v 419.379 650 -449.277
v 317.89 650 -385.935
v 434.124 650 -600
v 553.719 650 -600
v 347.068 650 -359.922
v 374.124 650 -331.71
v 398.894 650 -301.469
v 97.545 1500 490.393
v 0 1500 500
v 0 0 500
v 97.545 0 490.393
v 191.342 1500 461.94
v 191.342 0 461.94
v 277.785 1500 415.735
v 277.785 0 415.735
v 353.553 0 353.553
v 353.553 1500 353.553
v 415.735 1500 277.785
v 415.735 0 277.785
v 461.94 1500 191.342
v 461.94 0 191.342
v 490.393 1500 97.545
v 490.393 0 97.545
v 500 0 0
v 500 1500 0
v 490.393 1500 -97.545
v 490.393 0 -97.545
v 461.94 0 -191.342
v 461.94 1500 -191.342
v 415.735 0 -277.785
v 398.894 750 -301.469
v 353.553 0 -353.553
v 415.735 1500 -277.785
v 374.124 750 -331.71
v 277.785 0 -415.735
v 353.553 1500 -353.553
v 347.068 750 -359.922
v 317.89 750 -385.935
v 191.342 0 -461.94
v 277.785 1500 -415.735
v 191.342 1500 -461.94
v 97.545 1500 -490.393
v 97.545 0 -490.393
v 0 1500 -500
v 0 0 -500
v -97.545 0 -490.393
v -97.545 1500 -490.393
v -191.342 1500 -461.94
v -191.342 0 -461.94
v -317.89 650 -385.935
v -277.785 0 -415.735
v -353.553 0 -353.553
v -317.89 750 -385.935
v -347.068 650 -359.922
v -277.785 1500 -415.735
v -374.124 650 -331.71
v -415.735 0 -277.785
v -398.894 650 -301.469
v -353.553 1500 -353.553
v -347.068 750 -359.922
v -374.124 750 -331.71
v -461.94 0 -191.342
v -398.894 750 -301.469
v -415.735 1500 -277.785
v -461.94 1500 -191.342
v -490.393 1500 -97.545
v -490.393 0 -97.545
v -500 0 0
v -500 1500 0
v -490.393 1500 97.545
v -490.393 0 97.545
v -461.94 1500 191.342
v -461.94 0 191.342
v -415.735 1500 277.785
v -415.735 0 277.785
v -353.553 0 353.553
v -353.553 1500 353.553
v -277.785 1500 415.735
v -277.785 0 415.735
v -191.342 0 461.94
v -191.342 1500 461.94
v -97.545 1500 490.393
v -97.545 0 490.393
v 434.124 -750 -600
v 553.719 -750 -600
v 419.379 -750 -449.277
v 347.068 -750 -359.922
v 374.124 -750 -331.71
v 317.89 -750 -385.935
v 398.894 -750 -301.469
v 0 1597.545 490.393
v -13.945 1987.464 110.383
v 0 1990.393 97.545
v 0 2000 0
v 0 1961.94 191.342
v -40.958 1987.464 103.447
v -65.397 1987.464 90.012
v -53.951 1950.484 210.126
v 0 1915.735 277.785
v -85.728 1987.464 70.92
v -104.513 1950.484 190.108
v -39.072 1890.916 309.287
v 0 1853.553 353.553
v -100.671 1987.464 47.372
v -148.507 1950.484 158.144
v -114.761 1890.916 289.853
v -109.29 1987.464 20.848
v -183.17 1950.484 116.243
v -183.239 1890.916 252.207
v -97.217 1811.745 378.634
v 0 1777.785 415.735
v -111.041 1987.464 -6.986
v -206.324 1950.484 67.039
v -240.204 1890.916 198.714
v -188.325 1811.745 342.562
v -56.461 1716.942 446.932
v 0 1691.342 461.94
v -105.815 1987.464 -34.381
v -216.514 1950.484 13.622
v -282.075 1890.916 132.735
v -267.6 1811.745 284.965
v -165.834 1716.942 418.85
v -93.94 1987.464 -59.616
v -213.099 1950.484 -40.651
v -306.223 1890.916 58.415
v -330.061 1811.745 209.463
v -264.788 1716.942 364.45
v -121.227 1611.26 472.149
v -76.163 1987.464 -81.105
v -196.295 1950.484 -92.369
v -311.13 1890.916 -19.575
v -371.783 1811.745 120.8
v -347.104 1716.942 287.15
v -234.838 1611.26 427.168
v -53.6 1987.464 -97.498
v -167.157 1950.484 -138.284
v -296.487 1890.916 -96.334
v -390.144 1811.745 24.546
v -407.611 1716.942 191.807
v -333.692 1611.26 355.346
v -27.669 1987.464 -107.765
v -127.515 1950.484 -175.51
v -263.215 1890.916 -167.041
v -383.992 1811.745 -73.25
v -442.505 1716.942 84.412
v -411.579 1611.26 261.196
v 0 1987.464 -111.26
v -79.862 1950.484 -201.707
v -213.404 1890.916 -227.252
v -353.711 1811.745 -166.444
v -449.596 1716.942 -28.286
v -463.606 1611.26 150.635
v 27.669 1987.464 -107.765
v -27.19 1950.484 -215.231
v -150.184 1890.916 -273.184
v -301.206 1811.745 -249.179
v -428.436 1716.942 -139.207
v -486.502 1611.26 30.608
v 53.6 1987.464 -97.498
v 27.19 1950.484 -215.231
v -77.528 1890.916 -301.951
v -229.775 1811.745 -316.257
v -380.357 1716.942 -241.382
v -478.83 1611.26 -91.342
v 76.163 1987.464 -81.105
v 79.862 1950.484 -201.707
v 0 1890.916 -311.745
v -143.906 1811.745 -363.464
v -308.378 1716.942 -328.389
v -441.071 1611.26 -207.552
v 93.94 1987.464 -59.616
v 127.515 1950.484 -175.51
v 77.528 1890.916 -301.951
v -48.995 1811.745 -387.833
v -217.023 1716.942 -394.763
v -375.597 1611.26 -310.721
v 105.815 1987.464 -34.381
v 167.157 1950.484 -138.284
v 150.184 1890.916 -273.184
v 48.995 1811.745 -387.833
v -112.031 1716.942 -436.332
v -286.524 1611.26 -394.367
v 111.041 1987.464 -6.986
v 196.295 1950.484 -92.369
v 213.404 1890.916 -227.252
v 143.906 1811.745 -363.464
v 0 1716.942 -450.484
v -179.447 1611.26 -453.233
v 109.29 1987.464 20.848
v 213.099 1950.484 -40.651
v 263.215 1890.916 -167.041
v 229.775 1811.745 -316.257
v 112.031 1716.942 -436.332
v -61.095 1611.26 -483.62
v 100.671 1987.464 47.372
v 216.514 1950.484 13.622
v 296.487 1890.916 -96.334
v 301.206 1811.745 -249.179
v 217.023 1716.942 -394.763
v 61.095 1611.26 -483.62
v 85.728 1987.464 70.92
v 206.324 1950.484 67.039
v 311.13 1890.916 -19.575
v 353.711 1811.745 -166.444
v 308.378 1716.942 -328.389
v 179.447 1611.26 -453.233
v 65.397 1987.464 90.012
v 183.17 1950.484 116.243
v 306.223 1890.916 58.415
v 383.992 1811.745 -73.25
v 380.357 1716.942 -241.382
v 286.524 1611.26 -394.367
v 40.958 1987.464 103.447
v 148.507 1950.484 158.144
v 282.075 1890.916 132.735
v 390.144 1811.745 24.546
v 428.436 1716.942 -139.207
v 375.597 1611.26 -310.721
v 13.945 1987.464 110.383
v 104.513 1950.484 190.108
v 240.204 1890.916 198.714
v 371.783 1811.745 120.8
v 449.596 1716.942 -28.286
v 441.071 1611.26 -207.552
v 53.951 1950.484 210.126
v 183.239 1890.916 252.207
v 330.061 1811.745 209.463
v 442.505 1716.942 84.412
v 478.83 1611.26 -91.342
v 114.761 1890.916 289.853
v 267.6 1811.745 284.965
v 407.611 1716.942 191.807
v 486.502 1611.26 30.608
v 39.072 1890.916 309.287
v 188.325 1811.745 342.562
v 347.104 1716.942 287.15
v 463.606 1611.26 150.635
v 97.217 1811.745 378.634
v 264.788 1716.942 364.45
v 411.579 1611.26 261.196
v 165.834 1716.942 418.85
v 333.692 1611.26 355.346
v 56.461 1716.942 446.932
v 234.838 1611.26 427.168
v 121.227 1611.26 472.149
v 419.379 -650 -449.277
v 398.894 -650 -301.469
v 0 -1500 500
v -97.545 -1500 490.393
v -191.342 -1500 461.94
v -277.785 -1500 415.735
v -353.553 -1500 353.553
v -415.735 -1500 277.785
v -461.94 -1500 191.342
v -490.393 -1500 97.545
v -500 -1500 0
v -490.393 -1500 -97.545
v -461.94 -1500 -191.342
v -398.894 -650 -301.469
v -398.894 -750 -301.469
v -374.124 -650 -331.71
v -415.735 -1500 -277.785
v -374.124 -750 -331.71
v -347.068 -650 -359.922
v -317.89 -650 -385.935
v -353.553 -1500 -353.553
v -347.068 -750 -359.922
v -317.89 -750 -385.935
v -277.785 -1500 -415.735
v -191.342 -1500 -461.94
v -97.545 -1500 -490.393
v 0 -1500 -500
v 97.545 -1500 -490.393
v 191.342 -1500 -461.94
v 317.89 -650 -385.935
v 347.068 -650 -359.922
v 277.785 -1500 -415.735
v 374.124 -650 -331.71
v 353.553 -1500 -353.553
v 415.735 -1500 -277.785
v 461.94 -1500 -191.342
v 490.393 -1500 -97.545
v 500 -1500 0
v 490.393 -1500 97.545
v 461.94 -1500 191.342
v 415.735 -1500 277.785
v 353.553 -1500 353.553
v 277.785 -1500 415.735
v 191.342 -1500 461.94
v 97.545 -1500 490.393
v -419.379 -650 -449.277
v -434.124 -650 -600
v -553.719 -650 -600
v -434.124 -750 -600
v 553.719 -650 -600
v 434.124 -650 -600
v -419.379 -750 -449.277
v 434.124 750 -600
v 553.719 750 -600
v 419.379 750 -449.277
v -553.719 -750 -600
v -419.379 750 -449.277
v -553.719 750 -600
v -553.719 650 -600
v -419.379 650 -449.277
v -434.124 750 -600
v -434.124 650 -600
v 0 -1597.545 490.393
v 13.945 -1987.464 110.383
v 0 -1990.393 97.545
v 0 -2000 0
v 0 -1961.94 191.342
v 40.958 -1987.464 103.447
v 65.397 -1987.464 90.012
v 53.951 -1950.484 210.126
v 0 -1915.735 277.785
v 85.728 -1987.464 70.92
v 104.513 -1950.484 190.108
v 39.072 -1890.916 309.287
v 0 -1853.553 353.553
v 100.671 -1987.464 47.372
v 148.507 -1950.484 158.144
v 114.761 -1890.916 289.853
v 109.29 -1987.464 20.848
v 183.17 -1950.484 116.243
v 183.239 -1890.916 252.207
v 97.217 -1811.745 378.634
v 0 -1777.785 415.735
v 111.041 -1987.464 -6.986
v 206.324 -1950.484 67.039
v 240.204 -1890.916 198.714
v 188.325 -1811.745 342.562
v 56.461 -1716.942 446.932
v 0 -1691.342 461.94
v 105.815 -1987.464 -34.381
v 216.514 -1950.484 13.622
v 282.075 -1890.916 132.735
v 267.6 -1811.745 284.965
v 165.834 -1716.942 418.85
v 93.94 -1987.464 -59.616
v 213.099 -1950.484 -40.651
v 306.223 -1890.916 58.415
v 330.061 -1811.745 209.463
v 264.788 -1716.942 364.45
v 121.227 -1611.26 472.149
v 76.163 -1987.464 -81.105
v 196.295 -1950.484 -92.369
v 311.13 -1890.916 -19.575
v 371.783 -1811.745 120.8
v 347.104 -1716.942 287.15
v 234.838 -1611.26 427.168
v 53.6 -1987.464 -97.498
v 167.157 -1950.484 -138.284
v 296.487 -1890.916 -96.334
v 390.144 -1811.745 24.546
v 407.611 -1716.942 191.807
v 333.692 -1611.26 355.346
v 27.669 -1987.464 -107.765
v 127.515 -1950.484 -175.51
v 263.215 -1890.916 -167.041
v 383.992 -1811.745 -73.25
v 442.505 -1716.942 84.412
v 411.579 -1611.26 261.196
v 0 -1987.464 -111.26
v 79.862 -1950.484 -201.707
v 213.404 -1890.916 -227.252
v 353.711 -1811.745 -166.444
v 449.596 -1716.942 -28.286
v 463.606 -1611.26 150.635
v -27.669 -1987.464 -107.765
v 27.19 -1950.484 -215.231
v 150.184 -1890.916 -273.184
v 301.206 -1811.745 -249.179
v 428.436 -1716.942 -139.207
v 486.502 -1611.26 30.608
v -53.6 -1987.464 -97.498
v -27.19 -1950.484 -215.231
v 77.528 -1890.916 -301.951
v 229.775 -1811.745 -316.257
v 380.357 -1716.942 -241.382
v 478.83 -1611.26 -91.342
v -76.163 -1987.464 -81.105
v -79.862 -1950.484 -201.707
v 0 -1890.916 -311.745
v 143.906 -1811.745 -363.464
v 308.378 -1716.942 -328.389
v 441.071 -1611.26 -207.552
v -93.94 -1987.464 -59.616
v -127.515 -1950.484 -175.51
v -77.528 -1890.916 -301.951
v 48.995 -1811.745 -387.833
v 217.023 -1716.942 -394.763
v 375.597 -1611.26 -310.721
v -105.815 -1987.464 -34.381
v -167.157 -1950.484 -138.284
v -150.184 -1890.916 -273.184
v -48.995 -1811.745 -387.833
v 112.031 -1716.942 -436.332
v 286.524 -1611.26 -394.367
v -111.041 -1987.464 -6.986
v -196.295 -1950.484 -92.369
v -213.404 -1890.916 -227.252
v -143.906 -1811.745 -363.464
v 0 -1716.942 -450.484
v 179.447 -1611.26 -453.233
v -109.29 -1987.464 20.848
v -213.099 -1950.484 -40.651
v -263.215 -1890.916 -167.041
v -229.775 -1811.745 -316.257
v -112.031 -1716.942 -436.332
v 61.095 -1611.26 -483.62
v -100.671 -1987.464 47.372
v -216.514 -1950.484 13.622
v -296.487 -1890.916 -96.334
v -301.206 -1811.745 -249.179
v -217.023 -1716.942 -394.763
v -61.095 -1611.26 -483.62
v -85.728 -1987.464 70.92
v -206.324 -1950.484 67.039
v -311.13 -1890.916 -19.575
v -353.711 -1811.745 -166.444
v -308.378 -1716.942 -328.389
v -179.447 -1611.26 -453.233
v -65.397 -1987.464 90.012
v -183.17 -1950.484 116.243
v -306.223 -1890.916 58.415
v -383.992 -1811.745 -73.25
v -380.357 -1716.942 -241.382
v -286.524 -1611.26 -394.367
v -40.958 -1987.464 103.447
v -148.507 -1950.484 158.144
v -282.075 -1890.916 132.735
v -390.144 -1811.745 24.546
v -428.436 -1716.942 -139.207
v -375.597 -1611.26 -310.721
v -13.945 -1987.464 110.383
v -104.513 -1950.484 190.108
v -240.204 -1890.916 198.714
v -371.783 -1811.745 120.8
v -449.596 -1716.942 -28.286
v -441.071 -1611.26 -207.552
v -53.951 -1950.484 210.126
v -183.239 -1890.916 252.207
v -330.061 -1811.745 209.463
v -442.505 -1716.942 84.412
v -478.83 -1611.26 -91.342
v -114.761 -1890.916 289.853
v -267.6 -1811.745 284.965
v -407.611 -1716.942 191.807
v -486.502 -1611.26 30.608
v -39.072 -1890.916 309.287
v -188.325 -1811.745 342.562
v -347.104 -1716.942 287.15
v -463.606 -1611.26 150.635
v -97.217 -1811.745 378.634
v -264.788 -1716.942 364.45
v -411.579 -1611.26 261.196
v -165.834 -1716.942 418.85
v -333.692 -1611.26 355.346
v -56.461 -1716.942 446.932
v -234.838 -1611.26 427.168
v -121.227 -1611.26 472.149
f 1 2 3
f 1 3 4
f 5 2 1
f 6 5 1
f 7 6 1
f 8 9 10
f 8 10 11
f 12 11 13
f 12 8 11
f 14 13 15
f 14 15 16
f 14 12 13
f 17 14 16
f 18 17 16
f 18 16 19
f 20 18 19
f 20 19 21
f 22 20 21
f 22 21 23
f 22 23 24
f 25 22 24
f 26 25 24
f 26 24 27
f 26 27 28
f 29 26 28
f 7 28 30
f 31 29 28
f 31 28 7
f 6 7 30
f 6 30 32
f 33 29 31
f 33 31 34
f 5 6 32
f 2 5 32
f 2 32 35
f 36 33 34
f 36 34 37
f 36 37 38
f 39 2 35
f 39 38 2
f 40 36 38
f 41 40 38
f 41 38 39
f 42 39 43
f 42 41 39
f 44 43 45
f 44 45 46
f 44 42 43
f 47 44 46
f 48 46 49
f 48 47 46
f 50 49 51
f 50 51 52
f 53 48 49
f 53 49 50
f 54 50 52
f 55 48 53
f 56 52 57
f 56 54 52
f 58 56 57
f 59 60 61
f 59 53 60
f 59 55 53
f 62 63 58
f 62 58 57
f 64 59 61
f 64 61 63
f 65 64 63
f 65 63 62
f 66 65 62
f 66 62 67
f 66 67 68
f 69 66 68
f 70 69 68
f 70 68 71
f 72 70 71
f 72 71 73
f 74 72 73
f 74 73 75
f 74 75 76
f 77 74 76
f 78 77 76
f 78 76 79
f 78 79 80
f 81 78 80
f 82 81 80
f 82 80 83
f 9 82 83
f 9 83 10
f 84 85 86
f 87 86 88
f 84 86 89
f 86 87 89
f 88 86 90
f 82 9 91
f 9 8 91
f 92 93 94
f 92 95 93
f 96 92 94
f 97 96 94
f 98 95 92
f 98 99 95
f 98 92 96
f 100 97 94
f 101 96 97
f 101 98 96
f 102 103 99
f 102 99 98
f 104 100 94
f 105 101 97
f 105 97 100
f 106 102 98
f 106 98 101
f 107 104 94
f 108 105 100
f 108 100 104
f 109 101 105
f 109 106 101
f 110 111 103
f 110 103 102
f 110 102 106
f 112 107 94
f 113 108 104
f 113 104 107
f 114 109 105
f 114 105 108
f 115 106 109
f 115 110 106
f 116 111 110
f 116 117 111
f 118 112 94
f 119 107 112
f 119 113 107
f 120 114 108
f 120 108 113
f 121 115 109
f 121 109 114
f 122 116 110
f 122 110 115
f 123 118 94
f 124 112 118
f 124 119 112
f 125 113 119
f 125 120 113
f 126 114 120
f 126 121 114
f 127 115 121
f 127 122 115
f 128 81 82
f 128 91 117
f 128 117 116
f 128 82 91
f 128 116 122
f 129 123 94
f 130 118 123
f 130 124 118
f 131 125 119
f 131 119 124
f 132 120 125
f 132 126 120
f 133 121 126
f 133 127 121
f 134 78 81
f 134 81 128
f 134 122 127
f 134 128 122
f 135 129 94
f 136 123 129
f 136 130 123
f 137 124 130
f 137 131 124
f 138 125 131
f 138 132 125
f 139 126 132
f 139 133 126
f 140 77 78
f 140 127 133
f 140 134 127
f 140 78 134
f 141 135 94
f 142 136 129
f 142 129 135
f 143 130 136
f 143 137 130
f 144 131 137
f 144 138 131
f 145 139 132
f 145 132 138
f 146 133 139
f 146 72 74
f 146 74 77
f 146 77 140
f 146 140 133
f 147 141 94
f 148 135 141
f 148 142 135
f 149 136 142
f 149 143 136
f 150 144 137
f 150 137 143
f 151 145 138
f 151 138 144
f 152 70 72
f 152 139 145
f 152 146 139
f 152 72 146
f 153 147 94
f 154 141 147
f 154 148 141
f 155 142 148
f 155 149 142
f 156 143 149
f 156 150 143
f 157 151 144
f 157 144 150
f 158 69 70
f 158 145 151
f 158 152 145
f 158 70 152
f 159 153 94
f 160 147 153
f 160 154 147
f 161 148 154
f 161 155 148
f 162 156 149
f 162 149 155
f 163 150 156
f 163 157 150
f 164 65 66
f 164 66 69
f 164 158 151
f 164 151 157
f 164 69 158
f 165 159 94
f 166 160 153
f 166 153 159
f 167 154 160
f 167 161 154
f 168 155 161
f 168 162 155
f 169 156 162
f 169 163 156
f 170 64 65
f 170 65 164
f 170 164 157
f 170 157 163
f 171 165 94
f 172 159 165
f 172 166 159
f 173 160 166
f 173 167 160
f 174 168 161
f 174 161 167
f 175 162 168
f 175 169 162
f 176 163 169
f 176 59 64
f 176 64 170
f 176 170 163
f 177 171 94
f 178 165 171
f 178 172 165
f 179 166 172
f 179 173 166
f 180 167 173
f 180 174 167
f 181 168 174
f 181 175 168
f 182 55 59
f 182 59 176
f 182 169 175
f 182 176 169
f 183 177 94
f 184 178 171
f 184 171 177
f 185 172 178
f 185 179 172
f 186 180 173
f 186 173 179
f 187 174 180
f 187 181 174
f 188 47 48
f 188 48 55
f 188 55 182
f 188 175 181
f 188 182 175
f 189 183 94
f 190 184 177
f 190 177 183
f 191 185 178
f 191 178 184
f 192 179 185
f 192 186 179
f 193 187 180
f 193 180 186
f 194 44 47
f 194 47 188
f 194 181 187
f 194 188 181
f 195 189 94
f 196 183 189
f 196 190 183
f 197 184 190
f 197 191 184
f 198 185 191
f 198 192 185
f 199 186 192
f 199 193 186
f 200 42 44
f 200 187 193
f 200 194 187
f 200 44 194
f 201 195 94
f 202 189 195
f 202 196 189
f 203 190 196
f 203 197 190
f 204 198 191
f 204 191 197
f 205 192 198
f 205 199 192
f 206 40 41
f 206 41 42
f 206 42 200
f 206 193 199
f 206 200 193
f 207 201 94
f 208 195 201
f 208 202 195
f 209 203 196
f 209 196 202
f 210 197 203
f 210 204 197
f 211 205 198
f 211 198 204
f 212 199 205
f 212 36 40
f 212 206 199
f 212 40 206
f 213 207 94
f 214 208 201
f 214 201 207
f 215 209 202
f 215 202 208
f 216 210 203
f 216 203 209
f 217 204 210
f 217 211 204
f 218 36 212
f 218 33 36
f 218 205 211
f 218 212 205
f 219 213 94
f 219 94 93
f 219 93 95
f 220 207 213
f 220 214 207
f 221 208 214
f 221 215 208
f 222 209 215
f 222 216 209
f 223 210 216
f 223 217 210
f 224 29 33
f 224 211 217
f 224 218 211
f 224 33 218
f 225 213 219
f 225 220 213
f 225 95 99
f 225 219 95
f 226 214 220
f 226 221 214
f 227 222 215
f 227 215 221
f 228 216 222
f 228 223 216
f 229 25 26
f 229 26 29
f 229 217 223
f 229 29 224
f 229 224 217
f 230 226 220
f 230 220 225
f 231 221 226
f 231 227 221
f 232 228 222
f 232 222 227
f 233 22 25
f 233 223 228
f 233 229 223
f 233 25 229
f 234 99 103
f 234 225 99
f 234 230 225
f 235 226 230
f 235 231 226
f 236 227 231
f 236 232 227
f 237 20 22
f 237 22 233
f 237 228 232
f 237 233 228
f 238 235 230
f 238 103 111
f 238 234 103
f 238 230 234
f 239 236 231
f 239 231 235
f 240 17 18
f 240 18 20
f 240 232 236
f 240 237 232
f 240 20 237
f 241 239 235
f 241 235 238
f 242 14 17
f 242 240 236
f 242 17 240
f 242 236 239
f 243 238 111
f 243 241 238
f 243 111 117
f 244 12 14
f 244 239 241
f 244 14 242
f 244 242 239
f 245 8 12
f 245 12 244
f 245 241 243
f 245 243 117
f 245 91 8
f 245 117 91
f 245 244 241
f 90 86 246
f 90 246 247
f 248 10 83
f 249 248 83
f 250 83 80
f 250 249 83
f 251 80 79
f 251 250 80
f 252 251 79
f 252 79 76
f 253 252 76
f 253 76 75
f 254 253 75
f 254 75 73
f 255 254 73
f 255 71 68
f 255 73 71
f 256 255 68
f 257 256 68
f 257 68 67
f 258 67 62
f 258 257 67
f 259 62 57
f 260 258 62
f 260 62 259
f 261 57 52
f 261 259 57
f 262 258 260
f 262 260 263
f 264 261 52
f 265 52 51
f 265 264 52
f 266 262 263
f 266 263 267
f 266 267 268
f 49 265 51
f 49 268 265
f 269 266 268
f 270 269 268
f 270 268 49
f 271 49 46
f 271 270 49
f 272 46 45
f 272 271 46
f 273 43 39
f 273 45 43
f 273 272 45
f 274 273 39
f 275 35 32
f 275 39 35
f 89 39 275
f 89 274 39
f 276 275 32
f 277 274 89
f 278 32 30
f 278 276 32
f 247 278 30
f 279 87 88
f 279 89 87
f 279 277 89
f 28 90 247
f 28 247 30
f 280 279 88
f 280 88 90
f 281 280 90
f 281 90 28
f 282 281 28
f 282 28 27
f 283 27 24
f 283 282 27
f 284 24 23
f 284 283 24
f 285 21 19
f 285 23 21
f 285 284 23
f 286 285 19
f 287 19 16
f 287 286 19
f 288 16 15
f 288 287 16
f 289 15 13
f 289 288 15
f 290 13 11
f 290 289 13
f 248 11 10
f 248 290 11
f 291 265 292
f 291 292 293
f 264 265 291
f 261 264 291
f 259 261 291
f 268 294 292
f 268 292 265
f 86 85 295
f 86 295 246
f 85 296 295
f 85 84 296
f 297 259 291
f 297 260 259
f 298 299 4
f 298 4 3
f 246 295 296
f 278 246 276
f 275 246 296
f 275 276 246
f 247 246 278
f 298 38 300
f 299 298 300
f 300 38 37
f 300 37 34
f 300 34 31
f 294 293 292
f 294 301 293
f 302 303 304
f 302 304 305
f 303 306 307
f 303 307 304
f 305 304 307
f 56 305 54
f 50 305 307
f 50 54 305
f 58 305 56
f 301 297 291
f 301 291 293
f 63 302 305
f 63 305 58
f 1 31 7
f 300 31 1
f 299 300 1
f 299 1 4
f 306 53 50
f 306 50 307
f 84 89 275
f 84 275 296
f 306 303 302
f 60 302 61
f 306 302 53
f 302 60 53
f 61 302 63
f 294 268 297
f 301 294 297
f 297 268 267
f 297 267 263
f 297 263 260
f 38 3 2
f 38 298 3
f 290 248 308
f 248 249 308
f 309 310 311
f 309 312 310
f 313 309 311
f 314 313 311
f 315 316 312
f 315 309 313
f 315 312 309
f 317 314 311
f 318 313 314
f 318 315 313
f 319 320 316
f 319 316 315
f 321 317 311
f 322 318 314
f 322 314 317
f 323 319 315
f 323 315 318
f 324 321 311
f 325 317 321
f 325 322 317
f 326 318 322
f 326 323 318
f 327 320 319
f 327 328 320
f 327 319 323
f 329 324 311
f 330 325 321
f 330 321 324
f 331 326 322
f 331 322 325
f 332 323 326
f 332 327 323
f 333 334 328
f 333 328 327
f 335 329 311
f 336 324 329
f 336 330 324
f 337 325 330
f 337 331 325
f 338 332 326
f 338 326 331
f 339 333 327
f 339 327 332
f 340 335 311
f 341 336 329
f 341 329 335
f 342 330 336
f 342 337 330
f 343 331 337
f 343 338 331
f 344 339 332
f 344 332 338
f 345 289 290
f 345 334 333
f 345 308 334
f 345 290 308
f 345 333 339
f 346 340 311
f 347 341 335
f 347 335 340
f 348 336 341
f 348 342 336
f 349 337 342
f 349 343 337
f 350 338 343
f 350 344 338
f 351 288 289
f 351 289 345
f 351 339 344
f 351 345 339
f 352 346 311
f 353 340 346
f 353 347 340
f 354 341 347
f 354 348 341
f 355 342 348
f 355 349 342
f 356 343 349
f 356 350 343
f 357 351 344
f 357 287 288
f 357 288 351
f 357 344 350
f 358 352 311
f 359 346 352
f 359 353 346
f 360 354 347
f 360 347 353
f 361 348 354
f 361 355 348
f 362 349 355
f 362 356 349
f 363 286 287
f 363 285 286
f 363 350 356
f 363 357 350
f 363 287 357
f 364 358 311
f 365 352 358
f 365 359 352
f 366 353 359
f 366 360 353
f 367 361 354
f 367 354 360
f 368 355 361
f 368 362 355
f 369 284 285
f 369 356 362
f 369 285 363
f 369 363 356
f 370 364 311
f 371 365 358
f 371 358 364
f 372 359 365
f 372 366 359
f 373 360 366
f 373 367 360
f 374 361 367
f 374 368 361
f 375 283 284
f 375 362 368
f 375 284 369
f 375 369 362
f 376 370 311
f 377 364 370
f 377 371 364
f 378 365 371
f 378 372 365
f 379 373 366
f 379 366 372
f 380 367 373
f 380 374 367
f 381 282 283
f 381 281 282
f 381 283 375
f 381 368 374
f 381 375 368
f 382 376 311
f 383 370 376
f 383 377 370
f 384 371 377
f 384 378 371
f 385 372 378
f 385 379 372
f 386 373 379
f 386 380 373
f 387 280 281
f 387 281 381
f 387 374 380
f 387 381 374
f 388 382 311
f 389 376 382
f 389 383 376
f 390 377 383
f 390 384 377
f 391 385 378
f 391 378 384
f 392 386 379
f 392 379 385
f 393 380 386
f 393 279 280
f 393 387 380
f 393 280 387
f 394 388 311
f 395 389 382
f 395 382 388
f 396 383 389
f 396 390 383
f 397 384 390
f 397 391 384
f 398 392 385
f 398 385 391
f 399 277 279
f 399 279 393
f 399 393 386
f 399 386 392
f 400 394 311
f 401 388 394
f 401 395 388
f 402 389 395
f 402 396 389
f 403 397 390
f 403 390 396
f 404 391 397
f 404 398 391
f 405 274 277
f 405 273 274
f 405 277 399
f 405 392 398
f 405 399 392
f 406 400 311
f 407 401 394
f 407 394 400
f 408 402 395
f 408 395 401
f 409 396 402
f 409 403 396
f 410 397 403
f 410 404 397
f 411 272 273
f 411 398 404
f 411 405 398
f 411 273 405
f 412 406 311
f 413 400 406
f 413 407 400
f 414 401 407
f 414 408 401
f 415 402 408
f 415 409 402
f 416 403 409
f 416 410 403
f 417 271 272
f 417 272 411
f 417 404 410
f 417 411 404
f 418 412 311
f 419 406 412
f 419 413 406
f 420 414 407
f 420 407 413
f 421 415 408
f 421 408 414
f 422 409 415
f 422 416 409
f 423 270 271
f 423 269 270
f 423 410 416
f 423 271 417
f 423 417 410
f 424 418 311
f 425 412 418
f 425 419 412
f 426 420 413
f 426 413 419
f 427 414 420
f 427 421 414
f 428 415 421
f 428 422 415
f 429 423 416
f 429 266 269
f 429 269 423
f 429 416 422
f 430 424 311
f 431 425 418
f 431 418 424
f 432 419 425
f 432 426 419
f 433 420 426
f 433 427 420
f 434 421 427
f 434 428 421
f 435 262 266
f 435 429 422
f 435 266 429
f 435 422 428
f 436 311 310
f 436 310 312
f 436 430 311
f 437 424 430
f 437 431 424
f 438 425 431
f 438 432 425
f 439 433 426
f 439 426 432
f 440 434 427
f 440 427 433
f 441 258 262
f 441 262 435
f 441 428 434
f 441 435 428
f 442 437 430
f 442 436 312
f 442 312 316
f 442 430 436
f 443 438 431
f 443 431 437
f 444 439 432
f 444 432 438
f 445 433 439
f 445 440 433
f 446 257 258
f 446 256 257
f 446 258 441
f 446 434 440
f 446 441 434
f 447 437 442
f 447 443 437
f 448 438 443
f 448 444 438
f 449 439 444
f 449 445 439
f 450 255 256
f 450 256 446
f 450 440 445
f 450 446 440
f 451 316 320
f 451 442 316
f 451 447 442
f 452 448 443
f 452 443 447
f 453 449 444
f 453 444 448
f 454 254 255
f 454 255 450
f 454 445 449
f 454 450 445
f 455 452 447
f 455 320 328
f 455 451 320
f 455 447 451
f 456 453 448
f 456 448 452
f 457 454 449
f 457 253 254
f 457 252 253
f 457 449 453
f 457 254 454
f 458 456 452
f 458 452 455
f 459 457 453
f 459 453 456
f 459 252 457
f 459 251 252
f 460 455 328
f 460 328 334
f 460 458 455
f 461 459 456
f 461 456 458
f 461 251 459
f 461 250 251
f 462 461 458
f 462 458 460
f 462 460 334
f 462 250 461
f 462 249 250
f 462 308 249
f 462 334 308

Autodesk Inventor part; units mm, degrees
ref_plane "YZ Plane" through (0, 0, 0) normal (1, 0, 0) x (0, 1, 0)
ref_plane "XY Plane" through (0, 0, 0) normal (0, 0, 1) x (1, 0, 0)
sketch "Skizze3" plane through (0, 0, 0) normal (1, 0, 0) x (0, 1, 0)
  line L0 (0, 0) -> (2000, 0) construction
  line L1 (0, 0) -> (0, 500)
  line L2 (0, 500) -> (1500, 500)
  line L3 (-420.7107, 0) -> (2524.2641, 0) projected
  line L4 (0, -120.7107) -> (0, 724.2641) projected
  arc A0 (2000, 0) -> (1500, 500) centre (1500, 0) ccw
  line L5 (0, 0) -> (2000, 0)
  dimension "d6" = 1500
  dimension "d7" = 500
revolve "Umdrehung1" add sketch "Skizze3" angle 360 about axis through (0, 0, 0) along (0, 1, 0)
mirror "Spiegeln1" about plane through (0, 0, 500) normal (0, -1, 0) of "Umdrehung1"
ref_plane "Arbeitsebene1" through (0, -750, 0) normal (0, 1, 0) x (-1, 0, 0)
sketch "Skizze4" plane through (0, -750, 0) normal (0, 1, 0) x (-1, 0, 0)
  circle A0 centre (0, 0) radius 500 projected
  circle A1 centre (0, 0) radius 500 projected
  line L0 (-317.8898, -385.9353) -> (-434.1236, -600)
  line L1 (-434.1236, -600) -> (-553.7188, -600)
  line L2 (-553.7188, -600) -> (-419.3789, -449.2772)
  line L3 (-419.3789, -449.2772) -> (-398.8938, -301.4693)
  dimension "d9" = 600
extrude "Extrusion2" add sketch "Skizze4" along normal blind 100 contours A0 L0 L1 L2 L3
mirror "Spiegeln2" about plane through (0, 0, 0) normal (1, 0, 0) of "Extrusion2"
mirror "Spiegeln3" about plane through (0, 0, 0) normal (0, 1, 0) of "Extrusion2", "Spiegeln2"
properties part number "Gascontainer"
